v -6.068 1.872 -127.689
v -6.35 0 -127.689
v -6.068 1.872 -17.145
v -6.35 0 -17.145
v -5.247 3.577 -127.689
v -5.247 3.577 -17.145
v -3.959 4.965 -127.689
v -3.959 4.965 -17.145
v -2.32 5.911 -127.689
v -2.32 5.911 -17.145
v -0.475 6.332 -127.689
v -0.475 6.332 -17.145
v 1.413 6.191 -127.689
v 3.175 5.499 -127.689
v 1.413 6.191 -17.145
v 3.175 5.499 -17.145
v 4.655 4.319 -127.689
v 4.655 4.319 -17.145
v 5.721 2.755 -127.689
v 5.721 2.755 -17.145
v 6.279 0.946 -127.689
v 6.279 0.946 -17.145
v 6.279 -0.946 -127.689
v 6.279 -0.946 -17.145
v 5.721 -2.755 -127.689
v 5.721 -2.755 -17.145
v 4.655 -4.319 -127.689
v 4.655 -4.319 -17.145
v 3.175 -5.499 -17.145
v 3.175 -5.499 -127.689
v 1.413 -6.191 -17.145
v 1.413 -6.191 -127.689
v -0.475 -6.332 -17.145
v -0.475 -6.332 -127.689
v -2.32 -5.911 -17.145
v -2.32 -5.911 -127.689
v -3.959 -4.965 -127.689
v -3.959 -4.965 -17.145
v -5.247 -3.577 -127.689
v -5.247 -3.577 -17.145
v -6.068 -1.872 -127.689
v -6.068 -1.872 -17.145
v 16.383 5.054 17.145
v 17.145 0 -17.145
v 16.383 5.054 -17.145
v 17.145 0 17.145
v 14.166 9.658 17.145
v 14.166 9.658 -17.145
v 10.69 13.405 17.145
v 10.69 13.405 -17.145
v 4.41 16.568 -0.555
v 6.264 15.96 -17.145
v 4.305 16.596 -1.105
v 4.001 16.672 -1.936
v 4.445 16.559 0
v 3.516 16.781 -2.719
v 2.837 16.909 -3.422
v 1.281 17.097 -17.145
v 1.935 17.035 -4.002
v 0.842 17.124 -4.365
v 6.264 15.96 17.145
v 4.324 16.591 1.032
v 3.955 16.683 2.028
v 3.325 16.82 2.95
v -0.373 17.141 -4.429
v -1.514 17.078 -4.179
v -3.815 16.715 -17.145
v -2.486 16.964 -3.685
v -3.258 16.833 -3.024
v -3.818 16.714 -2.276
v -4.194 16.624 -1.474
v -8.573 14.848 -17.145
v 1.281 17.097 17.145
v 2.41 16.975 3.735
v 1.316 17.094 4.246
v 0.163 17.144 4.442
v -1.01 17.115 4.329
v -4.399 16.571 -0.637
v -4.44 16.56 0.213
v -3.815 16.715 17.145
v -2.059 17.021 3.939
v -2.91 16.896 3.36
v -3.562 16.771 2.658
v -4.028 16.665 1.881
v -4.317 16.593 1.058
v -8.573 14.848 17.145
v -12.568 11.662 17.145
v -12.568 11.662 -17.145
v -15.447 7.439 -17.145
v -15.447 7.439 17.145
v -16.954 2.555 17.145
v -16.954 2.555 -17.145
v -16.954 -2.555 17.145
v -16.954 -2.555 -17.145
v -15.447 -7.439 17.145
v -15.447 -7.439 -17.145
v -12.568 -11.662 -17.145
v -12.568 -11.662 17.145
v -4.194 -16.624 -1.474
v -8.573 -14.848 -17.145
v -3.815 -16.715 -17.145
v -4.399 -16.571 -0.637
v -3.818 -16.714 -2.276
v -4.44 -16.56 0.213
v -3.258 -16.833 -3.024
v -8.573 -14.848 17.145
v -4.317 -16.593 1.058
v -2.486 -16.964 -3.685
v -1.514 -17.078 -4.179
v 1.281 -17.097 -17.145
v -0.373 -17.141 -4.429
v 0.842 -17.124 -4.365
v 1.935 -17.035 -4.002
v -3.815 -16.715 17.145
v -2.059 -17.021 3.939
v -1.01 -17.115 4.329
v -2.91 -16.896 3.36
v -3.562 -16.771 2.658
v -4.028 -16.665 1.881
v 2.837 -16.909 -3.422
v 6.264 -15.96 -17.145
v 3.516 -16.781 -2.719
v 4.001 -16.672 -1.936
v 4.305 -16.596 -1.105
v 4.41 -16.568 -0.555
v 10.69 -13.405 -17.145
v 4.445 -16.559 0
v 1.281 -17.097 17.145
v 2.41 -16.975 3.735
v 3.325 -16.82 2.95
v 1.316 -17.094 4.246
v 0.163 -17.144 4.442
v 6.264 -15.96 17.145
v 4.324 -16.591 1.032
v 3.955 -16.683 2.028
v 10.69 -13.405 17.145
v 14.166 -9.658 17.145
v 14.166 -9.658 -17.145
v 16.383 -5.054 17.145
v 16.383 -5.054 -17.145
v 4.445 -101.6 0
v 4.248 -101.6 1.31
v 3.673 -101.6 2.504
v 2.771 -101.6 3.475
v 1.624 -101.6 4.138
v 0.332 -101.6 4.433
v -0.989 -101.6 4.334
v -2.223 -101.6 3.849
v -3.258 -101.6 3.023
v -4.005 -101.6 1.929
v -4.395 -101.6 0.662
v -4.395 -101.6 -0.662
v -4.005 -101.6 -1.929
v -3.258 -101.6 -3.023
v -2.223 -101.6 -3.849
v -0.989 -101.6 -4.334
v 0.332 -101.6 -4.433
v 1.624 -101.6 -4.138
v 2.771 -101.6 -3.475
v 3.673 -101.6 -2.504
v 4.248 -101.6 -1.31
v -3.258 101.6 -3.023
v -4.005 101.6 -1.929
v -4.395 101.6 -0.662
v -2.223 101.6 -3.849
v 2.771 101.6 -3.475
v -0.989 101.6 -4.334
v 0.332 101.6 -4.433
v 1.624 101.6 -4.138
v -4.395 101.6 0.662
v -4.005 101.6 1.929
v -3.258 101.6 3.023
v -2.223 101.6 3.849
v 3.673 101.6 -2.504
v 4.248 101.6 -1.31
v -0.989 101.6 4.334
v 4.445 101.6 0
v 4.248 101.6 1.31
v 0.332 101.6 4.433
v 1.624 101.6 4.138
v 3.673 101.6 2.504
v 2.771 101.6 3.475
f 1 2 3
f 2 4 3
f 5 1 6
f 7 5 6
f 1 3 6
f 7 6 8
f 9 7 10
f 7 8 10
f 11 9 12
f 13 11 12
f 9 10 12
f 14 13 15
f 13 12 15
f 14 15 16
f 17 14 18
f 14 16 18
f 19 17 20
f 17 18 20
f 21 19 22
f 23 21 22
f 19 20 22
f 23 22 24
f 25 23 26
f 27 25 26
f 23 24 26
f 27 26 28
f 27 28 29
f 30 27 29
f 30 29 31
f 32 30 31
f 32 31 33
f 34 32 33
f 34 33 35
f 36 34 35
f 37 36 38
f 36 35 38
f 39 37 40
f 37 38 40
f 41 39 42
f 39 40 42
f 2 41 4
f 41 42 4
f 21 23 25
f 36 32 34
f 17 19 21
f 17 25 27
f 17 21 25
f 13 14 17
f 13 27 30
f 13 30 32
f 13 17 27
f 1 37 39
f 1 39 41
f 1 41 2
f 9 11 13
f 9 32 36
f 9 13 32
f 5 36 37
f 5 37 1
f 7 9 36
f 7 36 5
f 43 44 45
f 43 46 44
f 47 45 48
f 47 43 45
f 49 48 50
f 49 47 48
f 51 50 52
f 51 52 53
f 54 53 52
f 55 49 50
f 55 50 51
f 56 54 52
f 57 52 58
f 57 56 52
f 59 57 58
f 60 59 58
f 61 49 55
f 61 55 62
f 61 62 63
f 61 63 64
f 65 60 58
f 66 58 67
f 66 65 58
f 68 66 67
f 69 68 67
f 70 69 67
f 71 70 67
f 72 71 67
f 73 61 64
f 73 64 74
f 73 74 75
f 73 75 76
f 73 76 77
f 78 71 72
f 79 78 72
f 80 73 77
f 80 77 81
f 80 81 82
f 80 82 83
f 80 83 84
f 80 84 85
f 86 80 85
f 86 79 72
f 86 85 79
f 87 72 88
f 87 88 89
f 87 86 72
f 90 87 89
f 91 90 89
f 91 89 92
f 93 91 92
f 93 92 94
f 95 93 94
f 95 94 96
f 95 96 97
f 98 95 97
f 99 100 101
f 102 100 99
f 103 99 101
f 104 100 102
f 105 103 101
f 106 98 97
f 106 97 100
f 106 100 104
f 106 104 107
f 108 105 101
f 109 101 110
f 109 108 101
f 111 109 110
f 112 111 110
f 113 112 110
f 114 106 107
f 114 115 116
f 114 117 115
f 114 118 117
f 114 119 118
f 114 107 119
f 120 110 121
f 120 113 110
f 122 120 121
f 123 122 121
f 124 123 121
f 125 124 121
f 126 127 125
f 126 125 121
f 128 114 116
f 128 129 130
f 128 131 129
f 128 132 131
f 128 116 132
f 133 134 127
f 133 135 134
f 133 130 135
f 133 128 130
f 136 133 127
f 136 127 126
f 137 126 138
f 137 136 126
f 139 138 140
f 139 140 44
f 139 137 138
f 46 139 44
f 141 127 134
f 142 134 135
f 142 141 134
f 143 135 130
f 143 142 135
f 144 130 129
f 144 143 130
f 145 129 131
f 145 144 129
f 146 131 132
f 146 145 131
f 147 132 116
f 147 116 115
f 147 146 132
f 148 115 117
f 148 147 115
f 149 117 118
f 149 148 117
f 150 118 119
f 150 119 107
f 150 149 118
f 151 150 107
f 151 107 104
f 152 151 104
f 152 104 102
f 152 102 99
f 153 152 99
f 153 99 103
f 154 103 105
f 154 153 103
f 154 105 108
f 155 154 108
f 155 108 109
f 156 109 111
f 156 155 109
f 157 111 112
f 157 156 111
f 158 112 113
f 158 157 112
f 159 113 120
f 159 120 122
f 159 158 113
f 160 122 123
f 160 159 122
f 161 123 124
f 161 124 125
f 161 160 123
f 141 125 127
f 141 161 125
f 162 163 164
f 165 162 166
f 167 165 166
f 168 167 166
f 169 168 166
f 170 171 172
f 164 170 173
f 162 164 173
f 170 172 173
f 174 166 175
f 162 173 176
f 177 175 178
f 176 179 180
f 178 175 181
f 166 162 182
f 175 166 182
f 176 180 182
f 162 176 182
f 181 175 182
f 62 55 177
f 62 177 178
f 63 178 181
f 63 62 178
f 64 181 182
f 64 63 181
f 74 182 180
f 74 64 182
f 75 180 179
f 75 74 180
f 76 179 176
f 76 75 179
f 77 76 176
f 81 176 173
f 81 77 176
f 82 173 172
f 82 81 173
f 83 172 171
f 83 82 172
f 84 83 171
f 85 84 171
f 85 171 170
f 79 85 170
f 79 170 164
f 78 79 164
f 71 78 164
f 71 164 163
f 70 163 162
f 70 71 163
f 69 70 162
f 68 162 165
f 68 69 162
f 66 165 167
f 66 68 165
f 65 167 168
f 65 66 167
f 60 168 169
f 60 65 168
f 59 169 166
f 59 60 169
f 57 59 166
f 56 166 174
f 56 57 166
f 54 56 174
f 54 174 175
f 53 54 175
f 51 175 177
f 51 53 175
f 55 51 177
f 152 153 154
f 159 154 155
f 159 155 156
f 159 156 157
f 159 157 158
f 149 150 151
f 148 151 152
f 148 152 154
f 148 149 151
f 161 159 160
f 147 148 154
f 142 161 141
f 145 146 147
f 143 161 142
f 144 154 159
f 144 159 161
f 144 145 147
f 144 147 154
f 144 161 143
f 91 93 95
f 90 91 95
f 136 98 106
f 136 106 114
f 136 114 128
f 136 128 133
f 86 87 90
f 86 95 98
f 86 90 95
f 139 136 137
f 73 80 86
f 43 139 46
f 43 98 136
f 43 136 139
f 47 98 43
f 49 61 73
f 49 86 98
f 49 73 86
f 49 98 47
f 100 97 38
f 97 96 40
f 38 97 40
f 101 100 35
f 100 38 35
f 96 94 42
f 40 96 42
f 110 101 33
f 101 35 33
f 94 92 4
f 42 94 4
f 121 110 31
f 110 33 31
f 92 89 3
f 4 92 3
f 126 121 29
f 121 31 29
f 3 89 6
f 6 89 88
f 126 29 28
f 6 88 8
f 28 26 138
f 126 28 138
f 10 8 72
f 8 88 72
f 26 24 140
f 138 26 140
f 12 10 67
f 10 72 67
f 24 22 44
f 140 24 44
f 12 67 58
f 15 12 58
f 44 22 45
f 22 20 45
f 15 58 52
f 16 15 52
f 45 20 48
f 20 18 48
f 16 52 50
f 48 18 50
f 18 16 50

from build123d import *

# Parameters (mm, degrees)
F0_R          = 17.145
F1_DEPTH      = 17.145
F2_W          = 6.35
F2_H          = 110.54443
F4_R          = 4.445
F5_DEPTH      = 17.146
F5_DEPTH_BACK = 25.4
F6_R          = 4.445
F7_DEPTH      = 101.6


with BuildPart() as f1:
    # F0 (on Top) → F1 (new body, symmetric)
    with BuildSketch(Plane.XY):
        Circle(F0_R)
    extrude(amount=F1_DEPTH, both=True)

    # F2 (on Front) → F3 (revolve)
    with BuildSketch(Plane.XZ):
        with Locations((-3.175, -72.417215)):
            Rectangle(F2_W, F2_H)
    revolve(axis=Axis((0, 0, -76.082058), (0, 0, -1)))

    # F4 (on Front) → F5 (cut, two sides)
    with BuildSketch(Plane.XZ) as f5_sk:
        Circle(F4_R)
    extrude(amount=-F5_DEPTH, mode=Mode.SUBTRACT)
    extrude(f5_sk.sketch, amount=-F5_DEPTH_BACK, mode=Mode.SUBTRACT)

    # F6 (on Front) → F7 (join, symmetric)
    with BuildSketch(Plane.XZ):
        Circle(F6_R)
    extrude(amount=F7_DEPTH, both=True)


solid = f1.part
